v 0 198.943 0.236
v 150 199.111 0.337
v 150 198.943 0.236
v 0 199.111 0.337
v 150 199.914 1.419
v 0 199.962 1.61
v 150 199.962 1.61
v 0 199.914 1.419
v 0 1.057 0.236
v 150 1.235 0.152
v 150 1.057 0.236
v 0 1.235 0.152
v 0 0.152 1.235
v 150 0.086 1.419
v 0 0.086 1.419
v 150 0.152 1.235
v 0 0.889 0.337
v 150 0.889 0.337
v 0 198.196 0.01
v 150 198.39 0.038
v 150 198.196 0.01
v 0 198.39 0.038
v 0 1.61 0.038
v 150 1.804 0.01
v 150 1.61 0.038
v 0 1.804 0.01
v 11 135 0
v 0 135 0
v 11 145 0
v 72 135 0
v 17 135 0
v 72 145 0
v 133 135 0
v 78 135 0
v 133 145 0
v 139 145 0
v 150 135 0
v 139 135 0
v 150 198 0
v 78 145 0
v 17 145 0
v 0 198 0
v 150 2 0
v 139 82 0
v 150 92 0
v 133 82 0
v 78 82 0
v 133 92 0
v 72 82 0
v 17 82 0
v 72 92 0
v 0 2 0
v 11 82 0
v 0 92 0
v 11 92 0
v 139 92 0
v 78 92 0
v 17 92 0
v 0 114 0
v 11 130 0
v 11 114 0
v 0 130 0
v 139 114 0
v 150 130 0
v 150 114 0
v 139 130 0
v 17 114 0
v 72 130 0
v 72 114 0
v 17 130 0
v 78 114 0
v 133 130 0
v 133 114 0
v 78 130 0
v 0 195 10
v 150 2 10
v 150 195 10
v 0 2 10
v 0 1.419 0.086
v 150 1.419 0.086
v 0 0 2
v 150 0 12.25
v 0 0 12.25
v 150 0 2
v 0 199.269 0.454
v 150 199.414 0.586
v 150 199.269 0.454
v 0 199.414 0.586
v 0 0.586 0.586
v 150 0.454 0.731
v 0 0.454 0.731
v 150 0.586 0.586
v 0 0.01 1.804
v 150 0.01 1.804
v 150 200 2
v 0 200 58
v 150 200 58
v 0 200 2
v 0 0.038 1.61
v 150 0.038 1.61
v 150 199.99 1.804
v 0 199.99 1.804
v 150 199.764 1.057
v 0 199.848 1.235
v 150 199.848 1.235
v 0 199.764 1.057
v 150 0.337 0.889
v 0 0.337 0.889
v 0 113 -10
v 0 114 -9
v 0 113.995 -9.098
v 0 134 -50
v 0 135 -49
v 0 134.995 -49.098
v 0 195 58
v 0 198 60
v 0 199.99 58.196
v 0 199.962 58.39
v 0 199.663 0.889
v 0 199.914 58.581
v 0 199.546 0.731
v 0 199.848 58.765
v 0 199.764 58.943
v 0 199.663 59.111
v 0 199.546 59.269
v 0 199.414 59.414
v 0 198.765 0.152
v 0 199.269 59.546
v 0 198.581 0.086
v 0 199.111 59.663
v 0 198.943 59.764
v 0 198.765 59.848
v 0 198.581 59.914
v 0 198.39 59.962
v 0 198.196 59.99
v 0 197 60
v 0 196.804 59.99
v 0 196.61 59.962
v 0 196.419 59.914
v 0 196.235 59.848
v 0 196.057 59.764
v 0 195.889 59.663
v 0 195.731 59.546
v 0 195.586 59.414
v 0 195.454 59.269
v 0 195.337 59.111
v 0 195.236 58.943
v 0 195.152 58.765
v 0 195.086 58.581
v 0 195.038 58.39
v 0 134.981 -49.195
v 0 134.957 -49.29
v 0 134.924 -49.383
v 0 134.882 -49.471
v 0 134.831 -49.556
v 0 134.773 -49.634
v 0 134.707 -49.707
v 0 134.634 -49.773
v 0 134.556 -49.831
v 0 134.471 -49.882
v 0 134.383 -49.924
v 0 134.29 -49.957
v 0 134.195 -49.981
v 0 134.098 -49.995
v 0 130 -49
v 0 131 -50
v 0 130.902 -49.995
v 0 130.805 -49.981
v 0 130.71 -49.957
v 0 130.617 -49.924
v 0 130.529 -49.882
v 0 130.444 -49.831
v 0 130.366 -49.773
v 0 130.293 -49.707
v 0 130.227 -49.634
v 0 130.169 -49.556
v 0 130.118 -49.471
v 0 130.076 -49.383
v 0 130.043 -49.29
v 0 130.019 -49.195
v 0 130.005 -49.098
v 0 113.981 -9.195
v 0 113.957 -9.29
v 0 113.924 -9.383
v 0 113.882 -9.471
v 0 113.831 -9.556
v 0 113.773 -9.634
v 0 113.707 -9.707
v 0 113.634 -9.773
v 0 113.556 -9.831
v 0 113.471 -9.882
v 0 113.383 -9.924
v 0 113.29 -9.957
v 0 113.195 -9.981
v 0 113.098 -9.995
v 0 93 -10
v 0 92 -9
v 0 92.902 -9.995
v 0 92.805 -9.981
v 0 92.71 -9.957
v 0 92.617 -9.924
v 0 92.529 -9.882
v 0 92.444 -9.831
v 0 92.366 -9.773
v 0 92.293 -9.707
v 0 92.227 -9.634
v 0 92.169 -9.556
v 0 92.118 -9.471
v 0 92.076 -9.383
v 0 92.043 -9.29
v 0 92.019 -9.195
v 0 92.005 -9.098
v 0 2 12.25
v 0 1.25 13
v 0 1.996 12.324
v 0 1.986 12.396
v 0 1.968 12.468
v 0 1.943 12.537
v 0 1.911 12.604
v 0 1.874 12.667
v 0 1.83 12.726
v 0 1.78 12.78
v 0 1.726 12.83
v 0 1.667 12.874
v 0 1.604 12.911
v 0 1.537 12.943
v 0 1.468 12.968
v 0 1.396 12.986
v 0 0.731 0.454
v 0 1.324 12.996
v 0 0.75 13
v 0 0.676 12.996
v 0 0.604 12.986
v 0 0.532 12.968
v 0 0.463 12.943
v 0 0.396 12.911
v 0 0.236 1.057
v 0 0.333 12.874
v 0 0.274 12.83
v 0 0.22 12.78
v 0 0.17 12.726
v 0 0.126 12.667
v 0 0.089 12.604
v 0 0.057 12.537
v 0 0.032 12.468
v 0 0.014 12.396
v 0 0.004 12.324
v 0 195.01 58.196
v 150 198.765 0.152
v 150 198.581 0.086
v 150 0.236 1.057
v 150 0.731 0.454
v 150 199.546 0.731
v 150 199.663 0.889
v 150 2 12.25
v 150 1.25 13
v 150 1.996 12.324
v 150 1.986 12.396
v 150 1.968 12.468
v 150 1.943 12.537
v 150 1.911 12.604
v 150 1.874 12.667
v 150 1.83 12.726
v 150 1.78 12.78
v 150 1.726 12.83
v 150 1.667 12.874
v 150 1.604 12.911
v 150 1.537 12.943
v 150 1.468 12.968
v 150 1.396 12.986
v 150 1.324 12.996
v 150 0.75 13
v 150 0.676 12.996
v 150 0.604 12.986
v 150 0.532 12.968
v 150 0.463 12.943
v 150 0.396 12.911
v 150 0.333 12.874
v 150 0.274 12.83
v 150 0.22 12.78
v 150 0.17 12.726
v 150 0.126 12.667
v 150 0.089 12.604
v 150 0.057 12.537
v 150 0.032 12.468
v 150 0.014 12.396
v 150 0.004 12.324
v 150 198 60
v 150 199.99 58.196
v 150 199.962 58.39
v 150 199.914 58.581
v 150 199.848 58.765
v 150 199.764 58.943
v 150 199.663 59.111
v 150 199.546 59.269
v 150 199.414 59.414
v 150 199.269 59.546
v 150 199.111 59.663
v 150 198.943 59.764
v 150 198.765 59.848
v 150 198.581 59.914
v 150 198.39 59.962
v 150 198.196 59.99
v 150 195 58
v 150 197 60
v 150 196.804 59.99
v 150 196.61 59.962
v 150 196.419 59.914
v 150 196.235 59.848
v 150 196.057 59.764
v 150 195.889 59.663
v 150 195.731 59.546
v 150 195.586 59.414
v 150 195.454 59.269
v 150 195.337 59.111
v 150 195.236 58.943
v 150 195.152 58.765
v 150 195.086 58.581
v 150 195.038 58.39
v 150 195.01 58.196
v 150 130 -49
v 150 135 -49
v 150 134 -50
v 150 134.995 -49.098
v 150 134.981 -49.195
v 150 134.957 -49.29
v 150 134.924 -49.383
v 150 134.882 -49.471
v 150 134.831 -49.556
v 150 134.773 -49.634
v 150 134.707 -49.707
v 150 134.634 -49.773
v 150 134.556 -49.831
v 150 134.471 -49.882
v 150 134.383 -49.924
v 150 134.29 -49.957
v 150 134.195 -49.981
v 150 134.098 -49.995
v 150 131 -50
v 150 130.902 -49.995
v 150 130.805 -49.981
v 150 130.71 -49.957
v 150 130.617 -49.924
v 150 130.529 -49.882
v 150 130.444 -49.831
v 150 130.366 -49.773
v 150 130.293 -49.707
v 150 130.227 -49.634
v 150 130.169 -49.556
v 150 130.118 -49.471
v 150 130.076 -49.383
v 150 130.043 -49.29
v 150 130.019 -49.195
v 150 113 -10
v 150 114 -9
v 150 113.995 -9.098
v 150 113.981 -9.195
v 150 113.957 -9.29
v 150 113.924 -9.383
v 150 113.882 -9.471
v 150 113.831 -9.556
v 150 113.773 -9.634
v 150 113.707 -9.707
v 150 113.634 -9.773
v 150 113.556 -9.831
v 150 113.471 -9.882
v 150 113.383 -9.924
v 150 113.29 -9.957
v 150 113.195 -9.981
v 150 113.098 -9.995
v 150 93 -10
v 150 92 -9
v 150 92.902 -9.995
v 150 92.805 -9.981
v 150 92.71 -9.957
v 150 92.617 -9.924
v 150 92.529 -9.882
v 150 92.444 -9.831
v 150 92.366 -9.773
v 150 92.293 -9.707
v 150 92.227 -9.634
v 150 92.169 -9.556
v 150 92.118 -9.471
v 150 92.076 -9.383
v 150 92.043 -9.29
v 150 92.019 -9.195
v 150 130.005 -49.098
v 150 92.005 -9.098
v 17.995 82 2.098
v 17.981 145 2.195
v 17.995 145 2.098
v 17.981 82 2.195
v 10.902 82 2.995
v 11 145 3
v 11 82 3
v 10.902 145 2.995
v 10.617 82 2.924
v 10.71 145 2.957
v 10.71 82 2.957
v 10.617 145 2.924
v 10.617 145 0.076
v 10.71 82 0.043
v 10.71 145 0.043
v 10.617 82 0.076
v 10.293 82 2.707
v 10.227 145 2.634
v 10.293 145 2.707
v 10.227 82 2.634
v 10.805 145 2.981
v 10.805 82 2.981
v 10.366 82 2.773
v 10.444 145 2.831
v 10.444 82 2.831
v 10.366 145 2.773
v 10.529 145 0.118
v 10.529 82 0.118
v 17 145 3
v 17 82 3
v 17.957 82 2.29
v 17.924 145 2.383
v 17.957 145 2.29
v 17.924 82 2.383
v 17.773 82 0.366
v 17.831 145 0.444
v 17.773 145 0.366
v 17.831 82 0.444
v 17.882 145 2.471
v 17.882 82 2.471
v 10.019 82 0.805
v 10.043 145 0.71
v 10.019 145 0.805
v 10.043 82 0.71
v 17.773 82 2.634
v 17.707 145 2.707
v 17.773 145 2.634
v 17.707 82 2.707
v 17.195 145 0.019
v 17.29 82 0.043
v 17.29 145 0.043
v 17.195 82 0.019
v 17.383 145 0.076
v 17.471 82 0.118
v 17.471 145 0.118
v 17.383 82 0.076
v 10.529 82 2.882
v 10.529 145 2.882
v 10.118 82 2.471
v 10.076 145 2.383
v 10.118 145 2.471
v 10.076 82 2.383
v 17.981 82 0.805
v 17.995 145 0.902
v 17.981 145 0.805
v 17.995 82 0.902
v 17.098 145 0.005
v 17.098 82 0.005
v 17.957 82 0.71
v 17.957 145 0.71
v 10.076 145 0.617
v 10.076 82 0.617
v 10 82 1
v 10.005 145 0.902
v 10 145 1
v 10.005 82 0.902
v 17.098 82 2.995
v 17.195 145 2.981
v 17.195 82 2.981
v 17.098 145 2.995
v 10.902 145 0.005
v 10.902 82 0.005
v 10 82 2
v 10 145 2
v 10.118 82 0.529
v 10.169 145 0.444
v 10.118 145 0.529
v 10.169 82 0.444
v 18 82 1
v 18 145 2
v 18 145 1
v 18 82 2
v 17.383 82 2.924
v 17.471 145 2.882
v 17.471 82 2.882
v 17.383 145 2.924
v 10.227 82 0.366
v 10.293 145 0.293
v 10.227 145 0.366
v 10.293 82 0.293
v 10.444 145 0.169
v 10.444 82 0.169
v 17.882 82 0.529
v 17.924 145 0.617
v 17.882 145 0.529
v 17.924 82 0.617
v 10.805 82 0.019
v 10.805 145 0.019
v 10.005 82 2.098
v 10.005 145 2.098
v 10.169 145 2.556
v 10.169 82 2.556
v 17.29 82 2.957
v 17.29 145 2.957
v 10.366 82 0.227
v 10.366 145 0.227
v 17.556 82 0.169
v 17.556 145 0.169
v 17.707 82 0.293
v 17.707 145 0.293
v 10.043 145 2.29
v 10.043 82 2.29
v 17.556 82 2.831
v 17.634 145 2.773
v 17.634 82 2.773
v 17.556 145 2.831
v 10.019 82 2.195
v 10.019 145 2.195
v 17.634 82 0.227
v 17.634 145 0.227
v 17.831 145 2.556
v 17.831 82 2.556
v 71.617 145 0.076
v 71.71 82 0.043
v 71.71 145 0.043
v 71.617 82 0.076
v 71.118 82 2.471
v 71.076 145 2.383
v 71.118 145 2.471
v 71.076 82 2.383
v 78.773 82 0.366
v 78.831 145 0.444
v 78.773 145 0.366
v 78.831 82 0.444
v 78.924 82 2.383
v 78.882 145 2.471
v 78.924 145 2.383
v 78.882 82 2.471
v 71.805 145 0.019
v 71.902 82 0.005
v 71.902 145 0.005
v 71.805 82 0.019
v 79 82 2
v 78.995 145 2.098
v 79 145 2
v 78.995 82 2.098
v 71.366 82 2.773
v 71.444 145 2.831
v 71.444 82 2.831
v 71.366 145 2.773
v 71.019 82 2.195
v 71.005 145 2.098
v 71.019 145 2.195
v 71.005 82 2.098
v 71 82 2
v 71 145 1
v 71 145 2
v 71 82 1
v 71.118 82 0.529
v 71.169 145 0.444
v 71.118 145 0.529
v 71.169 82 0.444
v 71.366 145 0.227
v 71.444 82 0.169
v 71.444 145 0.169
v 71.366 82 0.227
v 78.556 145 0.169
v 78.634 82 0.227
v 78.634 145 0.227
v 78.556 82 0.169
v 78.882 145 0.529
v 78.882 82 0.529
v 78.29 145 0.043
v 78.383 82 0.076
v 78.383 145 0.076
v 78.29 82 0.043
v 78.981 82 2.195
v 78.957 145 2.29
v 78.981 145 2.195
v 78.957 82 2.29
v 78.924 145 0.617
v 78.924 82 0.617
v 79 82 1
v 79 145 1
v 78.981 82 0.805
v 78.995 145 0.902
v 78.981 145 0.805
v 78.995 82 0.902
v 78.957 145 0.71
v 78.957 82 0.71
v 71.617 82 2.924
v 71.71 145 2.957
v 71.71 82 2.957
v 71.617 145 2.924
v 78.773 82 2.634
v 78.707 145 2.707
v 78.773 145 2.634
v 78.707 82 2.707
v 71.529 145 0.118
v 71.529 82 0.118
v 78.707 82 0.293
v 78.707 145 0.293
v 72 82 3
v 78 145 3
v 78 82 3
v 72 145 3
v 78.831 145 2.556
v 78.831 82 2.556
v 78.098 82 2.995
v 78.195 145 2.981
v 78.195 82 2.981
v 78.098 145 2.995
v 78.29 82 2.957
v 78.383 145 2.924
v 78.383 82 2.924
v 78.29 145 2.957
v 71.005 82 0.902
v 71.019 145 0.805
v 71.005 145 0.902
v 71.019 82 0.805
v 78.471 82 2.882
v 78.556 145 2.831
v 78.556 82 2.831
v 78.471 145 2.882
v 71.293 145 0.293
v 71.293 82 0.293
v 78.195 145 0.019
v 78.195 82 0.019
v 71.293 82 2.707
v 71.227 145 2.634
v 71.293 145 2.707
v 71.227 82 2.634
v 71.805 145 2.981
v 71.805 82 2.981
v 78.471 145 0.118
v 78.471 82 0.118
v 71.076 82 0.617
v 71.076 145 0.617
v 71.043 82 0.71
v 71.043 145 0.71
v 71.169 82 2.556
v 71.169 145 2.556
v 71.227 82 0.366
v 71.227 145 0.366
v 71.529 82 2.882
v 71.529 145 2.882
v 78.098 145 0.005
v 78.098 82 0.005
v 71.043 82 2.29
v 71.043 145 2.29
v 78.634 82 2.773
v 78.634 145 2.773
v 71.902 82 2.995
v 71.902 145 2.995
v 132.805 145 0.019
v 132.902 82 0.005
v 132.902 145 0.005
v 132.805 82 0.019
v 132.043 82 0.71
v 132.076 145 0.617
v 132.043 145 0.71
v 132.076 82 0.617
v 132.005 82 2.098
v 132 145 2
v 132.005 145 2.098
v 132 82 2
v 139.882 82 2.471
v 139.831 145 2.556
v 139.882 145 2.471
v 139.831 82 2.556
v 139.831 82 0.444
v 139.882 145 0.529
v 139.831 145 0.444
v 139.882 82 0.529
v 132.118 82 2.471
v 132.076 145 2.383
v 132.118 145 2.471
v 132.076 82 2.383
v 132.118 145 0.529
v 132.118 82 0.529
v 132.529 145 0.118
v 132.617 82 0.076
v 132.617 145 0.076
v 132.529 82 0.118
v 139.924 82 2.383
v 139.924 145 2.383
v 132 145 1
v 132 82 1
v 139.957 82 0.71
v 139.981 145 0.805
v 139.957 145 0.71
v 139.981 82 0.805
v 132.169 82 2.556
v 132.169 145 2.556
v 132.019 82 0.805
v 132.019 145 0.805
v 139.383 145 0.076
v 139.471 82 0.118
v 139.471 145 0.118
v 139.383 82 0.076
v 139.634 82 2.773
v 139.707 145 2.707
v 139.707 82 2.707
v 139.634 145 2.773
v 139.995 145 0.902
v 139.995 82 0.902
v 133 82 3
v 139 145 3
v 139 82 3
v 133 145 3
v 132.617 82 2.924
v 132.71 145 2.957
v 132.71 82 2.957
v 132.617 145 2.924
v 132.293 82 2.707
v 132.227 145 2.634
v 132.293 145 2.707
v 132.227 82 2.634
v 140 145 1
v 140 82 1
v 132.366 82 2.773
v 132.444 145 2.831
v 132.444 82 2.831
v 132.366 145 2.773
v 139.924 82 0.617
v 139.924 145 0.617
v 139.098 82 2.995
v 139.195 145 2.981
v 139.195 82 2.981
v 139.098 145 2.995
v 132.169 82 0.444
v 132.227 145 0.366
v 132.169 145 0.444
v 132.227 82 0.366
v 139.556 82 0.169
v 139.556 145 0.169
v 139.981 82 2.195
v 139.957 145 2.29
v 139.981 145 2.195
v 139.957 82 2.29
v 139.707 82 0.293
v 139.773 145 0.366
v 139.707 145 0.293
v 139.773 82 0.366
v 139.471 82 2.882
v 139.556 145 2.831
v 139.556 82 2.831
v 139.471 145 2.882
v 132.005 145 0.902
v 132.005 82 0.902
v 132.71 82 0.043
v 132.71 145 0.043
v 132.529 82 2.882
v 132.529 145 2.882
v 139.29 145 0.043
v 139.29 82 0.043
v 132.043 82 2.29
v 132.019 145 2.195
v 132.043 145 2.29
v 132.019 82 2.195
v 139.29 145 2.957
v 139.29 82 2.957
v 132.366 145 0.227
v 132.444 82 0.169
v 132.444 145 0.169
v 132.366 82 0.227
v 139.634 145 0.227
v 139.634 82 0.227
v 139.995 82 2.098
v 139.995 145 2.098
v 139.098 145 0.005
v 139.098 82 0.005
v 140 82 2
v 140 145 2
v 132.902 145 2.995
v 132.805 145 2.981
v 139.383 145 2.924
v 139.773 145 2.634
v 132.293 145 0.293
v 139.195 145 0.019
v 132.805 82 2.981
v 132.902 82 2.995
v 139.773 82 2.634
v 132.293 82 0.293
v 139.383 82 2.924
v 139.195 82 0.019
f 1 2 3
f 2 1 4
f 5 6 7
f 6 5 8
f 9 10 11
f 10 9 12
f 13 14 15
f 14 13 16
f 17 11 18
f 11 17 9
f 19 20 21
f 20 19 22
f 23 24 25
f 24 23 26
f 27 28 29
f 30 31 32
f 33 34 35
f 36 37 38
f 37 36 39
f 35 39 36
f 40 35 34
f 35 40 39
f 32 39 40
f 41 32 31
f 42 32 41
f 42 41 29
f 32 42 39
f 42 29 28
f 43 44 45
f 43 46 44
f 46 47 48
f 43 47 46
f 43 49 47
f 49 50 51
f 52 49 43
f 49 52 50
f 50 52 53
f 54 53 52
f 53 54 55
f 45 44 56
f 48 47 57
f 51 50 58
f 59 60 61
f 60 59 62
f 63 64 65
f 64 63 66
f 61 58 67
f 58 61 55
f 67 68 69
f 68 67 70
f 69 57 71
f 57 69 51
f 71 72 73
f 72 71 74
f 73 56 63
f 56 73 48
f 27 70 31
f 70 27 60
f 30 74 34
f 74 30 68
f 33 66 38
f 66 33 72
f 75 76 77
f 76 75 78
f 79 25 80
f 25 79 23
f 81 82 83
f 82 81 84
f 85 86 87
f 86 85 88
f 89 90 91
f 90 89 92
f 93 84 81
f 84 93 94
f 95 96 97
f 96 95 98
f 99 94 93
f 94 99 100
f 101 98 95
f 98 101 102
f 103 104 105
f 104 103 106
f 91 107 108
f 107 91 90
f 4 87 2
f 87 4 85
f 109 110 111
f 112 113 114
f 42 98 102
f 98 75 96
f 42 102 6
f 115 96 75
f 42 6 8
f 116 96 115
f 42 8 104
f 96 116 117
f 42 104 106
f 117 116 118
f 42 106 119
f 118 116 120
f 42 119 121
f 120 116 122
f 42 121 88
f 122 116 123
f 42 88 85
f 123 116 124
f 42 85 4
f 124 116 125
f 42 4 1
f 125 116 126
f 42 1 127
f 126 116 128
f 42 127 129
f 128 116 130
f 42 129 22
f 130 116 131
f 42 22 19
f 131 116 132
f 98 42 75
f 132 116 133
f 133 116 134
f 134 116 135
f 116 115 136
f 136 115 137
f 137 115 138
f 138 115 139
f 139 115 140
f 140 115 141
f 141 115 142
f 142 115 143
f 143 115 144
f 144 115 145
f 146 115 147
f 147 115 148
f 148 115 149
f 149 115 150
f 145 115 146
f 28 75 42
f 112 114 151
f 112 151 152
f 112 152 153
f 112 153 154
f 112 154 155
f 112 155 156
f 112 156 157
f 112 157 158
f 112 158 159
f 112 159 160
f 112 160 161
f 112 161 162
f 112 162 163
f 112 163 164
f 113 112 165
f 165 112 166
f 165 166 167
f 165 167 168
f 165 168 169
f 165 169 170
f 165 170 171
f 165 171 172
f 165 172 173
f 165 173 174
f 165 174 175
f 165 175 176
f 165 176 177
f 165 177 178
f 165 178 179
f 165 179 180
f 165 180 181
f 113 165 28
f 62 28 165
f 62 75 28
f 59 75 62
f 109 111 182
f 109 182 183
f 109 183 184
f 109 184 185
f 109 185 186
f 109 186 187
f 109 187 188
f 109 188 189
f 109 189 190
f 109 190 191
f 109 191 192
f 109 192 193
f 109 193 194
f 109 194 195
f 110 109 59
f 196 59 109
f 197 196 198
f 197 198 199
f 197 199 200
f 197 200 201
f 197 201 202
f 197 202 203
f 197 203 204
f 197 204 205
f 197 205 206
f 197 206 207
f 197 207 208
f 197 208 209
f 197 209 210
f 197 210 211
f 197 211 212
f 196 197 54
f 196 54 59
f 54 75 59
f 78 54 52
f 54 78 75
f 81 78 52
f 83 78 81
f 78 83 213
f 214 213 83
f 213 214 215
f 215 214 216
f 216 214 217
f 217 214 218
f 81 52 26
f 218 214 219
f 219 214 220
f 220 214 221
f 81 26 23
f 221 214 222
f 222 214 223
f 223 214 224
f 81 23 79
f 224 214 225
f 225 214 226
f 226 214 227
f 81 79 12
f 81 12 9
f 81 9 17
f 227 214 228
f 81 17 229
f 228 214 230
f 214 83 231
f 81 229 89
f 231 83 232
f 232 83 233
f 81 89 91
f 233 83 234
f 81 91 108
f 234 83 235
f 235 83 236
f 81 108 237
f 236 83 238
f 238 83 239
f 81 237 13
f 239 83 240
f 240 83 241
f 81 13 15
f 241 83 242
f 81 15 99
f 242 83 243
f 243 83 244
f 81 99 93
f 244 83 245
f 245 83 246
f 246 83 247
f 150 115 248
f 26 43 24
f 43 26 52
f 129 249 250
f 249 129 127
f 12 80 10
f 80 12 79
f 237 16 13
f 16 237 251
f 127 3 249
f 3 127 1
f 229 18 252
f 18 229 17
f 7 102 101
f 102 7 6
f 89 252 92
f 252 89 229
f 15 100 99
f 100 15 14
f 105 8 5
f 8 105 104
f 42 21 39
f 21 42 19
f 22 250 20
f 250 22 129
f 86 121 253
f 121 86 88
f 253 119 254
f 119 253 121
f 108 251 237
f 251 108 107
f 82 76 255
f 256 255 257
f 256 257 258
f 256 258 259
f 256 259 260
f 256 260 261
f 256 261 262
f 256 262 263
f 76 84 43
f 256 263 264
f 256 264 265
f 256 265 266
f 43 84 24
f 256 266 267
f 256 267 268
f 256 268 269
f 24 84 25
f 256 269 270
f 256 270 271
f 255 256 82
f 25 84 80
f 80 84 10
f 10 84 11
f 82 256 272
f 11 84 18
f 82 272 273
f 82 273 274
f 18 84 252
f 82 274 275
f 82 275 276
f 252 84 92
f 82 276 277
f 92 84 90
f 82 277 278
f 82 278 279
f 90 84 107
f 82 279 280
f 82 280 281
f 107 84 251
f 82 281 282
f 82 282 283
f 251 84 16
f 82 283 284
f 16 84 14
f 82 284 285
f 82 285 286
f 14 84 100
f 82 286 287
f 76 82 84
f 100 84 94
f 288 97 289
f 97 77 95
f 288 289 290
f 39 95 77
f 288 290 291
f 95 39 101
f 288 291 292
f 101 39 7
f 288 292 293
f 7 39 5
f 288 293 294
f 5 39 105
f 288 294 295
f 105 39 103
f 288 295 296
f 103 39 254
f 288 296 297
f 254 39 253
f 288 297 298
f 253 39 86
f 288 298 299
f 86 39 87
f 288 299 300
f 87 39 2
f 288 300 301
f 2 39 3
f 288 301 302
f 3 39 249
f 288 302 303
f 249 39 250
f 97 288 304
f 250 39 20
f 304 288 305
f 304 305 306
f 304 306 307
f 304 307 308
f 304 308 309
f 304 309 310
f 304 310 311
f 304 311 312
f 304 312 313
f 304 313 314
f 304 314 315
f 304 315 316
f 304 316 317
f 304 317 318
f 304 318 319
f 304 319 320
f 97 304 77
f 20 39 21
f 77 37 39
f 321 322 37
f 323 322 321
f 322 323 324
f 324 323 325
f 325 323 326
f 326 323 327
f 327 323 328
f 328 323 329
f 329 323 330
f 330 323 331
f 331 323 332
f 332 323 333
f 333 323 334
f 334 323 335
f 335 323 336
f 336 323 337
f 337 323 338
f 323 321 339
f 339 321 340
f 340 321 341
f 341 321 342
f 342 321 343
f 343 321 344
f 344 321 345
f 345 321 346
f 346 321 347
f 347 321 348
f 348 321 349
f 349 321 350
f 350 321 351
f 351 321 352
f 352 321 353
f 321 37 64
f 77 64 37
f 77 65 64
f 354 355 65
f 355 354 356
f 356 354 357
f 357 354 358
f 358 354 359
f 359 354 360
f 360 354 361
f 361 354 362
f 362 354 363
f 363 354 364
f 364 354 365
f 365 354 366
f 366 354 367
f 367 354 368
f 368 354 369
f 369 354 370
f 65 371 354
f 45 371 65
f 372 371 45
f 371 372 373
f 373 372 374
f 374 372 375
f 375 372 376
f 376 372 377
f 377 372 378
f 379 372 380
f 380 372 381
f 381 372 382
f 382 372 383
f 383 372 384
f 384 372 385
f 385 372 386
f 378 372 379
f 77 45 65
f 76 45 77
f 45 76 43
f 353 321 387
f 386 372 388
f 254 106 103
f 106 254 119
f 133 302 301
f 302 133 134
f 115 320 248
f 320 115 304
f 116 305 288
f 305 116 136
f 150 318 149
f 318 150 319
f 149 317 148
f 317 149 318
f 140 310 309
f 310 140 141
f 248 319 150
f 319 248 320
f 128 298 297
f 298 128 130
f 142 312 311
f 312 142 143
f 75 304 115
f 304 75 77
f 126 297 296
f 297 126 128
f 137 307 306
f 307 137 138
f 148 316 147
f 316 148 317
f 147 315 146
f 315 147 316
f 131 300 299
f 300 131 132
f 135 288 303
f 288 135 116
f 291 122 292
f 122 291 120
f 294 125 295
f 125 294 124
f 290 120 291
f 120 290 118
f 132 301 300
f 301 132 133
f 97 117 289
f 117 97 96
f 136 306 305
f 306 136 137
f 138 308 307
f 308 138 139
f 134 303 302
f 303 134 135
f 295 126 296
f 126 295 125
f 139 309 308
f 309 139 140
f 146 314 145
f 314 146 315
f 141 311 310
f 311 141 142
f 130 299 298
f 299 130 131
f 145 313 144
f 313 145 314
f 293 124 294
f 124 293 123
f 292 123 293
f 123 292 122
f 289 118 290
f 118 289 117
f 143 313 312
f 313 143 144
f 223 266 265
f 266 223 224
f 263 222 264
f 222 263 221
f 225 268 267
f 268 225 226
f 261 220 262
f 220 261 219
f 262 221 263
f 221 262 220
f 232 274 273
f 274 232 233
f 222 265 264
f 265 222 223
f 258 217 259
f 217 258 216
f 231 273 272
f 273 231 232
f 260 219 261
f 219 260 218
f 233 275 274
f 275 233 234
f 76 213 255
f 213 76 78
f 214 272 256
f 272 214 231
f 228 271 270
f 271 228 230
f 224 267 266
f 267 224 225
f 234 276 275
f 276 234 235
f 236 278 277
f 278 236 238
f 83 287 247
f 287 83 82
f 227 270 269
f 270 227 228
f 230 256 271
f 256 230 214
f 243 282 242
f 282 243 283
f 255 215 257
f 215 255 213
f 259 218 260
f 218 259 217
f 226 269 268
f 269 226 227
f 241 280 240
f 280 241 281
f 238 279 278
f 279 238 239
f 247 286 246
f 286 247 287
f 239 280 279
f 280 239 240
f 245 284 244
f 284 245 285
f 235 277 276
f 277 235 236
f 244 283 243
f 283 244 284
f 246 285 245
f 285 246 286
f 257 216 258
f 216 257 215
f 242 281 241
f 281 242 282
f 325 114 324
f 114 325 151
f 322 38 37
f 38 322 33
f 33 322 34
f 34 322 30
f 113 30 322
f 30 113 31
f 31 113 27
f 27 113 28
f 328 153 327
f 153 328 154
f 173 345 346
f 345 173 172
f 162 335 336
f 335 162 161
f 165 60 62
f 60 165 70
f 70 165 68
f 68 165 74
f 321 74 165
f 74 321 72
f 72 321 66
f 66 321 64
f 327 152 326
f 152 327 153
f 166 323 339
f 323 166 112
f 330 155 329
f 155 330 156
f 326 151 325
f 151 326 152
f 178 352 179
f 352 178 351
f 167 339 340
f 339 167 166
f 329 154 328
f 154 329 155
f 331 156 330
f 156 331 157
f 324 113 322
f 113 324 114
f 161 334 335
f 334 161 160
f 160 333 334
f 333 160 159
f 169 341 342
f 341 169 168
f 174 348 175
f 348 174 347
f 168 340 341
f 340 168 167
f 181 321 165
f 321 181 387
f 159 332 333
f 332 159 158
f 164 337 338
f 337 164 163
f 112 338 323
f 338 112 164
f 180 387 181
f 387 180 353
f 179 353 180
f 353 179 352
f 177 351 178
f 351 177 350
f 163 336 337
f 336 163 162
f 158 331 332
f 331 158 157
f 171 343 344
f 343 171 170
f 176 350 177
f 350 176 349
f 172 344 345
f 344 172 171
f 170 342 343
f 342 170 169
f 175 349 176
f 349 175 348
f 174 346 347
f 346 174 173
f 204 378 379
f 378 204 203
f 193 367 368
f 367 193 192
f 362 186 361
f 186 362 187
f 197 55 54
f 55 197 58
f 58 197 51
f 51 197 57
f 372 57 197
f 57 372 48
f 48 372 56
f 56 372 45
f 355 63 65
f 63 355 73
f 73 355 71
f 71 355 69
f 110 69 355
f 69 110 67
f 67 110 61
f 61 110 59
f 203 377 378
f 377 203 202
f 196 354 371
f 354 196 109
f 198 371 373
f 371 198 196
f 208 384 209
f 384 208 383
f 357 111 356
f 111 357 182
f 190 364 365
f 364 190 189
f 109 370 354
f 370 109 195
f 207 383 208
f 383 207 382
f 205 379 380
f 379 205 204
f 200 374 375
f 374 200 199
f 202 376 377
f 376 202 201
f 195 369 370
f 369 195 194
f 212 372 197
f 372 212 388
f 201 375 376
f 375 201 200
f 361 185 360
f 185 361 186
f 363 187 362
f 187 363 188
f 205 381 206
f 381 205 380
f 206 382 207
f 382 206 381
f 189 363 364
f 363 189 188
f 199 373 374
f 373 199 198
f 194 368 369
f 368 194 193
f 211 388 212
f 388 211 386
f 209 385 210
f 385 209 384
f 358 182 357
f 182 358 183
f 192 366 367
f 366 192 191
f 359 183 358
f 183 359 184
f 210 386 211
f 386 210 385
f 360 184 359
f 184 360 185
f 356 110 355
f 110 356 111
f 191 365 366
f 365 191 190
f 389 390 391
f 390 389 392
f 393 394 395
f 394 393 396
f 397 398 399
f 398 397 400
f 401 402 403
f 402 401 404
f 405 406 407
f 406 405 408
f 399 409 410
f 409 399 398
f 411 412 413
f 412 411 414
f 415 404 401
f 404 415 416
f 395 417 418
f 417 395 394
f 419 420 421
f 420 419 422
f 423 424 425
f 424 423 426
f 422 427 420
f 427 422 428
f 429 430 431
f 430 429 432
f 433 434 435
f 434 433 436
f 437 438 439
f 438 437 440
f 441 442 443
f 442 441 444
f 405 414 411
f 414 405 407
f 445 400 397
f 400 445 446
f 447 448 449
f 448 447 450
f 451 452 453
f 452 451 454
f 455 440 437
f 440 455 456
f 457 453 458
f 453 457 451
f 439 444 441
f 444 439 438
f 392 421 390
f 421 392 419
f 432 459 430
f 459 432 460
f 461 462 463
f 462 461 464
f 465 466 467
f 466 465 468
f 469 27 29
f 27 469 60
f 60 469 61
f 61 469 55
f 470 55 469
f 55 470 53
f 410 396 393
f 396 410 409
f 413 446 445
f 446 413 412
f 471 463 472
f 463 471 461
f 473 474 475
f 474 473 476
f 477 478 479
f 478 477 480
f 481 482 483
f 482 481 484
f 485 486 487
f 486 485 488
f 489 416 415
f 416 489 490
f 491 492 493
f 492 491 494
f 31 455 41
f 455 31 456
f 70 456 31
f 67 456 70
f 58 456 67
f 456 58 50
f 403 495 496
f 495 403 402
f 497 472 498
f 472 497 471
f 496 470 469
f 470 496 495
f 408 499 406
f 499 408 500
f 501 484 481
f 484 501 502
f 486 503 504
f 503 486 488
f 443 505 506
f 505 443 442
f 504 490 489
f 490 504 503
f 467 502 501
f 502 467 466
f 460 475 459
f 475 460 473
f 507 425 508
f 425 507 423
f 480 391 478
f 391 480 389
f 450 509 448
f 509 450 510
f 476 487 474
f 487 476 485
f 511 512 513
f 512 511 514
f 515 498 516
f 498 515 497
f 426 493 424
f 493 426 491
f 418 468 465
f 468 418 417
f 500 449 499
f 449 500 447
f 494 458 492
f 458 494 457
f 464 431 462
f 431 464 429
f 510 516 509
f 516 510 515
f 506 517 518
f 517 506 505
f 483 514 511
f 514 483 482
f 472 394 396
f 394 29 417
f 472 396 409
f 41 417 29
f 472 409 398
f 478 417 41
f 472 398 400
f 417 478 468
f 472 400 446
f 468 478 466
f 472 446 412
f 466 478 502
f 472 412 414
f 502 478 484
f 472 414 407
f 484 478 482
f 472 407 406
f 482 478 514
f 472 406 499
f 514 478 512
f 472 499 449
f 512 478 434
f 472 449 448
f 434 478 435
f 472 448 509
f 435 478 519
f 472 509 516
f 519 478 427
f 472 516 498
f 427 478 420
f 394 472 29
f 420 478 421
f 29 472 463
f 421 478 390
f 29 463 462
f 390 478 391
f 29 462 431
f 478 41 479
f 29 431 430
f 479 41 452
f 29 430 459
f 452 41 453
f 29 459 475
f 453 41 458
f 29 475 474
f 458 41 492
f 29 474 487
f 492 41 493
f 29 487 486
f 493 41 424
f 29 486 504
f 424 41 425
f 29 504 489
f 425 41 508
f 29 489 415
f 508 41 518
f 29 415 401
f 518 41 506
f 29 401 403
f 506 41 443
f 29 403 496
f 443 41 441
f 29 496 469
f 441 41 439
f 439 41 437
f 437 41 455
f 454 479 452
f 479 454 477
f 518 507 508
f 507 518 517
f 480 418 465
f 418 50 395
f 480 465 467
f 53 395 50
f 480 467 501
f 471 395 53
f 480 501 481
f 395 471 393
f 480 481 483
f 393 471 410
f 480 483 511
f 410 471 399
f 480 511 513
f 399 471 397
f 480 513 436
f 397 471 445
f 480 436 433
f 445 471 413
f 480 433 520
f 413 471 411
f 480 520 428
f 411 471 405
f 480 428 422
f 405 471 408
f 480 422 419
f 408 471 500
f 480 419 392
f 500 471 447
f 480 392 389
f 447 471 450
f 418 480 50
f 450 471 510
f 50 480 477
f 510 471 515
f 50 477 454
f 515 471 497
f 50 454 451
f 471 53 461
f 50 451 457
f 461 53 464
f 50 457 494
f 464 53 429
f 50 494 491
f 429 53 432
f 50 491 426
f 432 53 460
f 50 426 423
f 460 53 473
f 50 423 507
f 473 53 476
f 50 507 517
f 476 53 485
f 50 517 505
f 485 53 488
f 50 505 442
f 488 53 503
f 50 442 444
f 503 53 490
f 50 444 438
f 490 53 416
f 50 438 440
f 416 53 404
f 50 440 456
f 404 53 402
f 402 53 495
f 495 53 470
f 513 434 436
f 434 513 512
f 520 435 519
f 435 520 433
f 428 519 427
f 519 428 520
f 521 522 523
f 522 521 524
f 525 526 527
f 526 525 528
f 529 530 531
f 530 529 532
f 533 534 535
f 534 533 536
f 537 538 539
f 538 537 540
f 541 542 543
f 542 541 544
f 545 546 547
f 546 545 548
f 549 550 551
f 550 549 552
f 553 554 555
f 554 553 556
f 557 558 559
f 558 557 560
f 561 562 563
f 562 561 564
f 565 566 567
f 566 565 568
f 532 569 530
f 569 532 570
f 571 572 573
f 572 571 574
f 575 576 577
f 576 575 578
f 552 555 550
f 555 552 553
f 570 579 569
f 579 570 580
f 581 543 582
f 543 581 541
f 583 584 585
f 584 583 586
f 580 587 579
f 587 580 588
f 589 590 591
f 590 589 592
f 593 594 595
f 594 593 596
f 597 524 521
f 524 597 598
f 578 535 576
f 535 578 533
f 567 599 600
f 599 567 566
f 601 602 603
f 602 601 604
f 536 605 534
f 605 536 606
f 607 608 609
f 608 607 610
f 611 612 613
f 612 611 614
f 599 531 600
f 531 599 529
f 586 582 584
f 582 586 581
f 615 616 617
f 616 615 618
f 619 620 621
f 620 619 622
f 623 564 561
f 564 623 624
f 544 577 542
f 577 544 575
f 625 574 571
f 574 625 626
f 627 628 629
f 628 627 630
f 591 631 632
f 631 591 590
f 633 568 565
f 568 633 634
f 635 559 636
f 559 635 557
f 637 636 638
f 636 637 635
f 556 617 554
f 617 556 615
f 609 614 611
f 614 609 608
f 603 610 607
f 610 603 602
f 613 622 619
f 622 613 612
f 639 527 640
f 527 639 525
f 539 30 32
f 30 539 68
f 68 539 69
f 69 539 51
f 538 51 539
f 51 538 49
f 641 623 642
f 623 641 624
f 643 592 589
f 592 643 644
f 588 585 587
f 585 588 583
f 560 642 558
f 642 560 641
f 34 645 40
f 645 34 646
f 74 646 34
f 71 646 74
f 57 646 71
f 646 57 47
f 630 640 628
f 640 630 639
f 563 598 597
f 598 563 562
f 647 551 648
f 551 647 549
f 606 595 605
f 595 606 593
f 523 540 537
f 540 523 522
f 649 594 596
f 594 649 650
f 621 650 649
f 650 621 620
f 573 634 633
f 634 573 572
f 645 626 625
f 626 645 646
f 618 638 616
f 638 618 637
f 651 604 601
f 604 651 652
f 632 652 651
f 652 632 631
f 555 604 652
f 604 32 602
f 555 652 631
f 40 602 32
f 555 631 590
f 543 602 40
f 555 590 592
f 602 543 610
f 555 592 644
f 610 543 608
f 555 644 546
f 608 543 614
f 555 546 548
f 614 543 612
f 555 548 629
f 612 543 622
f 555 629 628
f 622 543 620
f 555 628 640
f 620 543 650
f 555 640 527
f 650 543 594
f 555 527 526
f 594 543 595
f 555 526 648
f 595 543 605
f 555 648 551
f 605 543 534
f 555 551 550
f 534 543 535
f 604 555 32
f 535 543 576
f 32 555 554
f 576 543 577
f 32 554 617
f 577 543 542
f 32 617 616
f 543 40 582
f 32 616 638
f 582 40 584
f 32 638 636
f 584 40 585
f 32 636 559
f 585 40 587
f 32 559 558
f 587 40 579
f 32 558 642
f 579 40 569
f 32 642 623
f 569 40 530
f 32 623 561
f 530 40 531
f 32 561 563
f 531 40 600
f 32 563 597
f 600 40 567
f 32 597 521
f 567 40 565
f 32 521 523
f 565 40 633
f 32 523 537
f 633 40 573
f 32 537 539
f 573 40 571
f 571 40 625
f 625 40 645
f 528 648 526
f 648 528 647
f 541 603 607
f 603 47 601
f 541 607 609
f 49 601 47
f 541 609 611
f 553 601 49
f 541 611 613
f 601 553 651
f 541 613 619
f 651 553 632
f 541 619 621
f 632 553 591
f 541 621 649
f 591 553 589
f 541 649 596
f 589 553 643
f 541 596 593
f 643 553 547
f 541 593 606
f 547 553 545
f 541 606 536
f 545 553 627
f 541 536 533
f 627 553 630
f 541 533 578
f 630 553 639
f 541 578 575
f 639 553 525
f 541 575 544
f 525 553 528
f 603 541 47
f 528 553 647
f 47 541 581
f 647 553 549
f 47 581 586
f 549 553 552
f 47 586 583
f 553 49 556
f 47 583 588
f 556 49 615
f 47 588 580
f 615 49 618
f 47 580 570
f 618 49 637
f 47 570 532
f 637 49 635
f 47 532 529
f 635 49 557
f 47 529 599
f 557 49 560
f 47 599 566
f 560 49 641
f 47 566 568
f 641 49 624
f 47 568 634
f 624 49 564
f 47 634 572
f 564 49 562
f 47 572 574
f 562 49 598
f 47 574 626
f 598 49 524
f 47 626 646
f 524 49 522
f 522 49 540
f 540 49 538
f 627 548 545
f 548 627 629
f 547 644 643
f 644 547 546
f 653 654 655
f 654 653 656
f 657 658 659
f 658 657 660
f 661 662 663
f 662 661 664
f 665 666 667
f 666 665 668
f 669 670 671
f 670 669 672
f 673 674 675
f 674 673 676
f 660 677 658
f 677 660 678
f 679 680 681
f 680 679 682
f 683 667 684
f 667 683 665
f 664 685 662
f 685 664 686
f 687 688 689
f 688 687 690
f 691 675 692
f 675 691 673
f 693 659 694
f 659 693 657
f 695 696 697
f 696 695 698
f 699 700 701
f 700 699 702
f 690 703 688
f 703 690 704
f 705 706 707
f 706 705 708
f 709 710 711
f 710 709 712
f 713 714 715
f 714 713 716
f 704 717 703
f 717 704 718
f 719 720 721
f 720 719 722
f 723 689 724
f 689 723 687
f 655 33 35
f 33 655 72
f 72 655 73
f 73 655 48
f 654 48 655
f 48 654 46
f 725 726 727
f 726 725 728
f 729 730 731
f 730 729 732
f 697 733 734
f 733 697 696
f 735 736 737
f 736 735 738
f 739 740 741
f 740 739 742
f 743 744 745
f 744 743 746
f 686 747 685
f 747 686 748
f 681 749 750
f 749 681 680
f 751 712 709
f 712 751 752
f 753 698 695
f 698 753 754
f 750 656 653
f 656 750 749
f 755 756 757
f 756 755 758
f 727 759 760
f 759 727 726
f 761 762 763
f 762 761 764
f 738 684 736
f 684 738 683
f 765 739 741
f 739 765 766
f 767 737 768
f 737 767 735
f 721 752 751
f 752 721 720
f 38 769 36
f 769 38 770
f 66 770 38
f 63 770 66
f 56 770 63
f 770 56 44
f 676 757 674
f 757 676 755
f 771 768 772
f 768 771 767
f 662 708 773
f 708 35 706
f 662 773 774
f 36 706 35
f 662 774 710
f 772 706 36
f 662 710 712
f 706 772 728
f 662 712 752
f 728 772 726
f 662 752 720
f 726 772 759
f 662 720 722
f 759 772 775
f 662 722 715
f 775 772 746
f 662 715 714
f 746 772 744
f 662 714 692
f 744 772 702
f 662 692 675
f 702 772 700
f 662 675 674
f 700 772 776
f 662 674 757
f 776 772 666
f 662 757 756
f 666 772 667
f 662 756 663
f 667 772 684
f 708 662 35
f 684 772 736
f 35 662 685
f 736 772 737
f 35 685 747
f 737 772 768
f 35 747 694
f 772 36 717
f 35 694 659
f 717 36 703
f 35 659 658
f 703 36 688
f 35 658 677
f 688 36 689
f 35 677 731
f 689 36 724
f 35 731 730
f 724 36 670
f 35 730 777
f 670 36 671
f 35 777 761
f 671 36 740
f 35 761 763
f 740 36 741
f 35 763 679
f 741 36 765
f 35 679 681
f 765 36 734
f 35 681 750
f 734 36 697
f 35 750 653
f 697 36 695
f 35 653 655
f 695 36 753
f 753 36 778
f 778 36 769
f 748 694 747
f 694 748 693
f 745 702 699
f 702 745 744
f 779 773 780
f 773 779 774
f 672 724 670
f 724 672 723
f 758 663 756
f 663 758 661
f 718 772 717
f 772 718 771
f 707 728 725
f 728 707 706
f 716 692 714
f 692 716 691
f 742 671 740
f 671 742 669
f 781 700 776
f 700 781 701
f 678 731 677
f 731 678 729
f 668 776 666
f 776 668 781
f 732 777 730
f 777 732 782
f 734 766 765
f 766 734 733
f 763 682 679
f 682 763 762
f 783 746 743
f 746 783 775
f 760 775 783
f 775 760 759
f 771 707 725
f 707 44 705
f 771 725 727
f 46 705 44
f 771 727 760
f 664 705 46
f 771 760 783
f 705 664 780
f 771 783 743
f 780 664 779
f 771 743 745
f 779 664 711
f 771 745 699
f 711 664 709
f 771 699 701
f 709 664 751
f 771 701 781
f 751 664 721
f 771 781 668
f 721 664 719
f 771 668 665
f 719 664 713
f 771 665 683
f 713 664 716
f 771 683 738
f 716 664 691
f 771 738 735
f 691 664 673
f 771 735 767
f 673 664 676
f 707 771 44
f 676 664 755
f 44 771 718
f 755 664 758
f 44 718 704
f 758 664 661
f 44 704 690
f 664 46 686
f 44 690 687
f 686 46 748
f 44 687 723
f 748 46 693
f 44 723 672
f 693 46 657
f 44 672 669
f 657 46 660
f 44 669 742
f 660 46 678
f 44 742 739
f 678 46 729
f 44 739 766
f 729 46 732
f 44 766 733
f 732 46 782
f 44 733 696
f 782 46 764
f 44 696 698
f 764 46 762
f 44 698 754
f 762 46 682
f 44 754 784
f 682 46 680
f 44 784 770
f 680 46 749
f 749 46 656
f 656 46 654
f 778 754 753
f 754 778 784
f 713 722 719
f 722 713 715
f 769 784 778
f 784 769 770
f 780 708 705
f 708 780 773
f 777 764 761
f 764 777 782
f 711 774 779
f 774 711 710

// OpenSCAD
// 150mm-wide × 200mm-deep bar shelf — see bar_shelf.scad for the design.
shelf_width_override = 150;
shelf_depth_override = 200;
include <bar_shelf.scad>
